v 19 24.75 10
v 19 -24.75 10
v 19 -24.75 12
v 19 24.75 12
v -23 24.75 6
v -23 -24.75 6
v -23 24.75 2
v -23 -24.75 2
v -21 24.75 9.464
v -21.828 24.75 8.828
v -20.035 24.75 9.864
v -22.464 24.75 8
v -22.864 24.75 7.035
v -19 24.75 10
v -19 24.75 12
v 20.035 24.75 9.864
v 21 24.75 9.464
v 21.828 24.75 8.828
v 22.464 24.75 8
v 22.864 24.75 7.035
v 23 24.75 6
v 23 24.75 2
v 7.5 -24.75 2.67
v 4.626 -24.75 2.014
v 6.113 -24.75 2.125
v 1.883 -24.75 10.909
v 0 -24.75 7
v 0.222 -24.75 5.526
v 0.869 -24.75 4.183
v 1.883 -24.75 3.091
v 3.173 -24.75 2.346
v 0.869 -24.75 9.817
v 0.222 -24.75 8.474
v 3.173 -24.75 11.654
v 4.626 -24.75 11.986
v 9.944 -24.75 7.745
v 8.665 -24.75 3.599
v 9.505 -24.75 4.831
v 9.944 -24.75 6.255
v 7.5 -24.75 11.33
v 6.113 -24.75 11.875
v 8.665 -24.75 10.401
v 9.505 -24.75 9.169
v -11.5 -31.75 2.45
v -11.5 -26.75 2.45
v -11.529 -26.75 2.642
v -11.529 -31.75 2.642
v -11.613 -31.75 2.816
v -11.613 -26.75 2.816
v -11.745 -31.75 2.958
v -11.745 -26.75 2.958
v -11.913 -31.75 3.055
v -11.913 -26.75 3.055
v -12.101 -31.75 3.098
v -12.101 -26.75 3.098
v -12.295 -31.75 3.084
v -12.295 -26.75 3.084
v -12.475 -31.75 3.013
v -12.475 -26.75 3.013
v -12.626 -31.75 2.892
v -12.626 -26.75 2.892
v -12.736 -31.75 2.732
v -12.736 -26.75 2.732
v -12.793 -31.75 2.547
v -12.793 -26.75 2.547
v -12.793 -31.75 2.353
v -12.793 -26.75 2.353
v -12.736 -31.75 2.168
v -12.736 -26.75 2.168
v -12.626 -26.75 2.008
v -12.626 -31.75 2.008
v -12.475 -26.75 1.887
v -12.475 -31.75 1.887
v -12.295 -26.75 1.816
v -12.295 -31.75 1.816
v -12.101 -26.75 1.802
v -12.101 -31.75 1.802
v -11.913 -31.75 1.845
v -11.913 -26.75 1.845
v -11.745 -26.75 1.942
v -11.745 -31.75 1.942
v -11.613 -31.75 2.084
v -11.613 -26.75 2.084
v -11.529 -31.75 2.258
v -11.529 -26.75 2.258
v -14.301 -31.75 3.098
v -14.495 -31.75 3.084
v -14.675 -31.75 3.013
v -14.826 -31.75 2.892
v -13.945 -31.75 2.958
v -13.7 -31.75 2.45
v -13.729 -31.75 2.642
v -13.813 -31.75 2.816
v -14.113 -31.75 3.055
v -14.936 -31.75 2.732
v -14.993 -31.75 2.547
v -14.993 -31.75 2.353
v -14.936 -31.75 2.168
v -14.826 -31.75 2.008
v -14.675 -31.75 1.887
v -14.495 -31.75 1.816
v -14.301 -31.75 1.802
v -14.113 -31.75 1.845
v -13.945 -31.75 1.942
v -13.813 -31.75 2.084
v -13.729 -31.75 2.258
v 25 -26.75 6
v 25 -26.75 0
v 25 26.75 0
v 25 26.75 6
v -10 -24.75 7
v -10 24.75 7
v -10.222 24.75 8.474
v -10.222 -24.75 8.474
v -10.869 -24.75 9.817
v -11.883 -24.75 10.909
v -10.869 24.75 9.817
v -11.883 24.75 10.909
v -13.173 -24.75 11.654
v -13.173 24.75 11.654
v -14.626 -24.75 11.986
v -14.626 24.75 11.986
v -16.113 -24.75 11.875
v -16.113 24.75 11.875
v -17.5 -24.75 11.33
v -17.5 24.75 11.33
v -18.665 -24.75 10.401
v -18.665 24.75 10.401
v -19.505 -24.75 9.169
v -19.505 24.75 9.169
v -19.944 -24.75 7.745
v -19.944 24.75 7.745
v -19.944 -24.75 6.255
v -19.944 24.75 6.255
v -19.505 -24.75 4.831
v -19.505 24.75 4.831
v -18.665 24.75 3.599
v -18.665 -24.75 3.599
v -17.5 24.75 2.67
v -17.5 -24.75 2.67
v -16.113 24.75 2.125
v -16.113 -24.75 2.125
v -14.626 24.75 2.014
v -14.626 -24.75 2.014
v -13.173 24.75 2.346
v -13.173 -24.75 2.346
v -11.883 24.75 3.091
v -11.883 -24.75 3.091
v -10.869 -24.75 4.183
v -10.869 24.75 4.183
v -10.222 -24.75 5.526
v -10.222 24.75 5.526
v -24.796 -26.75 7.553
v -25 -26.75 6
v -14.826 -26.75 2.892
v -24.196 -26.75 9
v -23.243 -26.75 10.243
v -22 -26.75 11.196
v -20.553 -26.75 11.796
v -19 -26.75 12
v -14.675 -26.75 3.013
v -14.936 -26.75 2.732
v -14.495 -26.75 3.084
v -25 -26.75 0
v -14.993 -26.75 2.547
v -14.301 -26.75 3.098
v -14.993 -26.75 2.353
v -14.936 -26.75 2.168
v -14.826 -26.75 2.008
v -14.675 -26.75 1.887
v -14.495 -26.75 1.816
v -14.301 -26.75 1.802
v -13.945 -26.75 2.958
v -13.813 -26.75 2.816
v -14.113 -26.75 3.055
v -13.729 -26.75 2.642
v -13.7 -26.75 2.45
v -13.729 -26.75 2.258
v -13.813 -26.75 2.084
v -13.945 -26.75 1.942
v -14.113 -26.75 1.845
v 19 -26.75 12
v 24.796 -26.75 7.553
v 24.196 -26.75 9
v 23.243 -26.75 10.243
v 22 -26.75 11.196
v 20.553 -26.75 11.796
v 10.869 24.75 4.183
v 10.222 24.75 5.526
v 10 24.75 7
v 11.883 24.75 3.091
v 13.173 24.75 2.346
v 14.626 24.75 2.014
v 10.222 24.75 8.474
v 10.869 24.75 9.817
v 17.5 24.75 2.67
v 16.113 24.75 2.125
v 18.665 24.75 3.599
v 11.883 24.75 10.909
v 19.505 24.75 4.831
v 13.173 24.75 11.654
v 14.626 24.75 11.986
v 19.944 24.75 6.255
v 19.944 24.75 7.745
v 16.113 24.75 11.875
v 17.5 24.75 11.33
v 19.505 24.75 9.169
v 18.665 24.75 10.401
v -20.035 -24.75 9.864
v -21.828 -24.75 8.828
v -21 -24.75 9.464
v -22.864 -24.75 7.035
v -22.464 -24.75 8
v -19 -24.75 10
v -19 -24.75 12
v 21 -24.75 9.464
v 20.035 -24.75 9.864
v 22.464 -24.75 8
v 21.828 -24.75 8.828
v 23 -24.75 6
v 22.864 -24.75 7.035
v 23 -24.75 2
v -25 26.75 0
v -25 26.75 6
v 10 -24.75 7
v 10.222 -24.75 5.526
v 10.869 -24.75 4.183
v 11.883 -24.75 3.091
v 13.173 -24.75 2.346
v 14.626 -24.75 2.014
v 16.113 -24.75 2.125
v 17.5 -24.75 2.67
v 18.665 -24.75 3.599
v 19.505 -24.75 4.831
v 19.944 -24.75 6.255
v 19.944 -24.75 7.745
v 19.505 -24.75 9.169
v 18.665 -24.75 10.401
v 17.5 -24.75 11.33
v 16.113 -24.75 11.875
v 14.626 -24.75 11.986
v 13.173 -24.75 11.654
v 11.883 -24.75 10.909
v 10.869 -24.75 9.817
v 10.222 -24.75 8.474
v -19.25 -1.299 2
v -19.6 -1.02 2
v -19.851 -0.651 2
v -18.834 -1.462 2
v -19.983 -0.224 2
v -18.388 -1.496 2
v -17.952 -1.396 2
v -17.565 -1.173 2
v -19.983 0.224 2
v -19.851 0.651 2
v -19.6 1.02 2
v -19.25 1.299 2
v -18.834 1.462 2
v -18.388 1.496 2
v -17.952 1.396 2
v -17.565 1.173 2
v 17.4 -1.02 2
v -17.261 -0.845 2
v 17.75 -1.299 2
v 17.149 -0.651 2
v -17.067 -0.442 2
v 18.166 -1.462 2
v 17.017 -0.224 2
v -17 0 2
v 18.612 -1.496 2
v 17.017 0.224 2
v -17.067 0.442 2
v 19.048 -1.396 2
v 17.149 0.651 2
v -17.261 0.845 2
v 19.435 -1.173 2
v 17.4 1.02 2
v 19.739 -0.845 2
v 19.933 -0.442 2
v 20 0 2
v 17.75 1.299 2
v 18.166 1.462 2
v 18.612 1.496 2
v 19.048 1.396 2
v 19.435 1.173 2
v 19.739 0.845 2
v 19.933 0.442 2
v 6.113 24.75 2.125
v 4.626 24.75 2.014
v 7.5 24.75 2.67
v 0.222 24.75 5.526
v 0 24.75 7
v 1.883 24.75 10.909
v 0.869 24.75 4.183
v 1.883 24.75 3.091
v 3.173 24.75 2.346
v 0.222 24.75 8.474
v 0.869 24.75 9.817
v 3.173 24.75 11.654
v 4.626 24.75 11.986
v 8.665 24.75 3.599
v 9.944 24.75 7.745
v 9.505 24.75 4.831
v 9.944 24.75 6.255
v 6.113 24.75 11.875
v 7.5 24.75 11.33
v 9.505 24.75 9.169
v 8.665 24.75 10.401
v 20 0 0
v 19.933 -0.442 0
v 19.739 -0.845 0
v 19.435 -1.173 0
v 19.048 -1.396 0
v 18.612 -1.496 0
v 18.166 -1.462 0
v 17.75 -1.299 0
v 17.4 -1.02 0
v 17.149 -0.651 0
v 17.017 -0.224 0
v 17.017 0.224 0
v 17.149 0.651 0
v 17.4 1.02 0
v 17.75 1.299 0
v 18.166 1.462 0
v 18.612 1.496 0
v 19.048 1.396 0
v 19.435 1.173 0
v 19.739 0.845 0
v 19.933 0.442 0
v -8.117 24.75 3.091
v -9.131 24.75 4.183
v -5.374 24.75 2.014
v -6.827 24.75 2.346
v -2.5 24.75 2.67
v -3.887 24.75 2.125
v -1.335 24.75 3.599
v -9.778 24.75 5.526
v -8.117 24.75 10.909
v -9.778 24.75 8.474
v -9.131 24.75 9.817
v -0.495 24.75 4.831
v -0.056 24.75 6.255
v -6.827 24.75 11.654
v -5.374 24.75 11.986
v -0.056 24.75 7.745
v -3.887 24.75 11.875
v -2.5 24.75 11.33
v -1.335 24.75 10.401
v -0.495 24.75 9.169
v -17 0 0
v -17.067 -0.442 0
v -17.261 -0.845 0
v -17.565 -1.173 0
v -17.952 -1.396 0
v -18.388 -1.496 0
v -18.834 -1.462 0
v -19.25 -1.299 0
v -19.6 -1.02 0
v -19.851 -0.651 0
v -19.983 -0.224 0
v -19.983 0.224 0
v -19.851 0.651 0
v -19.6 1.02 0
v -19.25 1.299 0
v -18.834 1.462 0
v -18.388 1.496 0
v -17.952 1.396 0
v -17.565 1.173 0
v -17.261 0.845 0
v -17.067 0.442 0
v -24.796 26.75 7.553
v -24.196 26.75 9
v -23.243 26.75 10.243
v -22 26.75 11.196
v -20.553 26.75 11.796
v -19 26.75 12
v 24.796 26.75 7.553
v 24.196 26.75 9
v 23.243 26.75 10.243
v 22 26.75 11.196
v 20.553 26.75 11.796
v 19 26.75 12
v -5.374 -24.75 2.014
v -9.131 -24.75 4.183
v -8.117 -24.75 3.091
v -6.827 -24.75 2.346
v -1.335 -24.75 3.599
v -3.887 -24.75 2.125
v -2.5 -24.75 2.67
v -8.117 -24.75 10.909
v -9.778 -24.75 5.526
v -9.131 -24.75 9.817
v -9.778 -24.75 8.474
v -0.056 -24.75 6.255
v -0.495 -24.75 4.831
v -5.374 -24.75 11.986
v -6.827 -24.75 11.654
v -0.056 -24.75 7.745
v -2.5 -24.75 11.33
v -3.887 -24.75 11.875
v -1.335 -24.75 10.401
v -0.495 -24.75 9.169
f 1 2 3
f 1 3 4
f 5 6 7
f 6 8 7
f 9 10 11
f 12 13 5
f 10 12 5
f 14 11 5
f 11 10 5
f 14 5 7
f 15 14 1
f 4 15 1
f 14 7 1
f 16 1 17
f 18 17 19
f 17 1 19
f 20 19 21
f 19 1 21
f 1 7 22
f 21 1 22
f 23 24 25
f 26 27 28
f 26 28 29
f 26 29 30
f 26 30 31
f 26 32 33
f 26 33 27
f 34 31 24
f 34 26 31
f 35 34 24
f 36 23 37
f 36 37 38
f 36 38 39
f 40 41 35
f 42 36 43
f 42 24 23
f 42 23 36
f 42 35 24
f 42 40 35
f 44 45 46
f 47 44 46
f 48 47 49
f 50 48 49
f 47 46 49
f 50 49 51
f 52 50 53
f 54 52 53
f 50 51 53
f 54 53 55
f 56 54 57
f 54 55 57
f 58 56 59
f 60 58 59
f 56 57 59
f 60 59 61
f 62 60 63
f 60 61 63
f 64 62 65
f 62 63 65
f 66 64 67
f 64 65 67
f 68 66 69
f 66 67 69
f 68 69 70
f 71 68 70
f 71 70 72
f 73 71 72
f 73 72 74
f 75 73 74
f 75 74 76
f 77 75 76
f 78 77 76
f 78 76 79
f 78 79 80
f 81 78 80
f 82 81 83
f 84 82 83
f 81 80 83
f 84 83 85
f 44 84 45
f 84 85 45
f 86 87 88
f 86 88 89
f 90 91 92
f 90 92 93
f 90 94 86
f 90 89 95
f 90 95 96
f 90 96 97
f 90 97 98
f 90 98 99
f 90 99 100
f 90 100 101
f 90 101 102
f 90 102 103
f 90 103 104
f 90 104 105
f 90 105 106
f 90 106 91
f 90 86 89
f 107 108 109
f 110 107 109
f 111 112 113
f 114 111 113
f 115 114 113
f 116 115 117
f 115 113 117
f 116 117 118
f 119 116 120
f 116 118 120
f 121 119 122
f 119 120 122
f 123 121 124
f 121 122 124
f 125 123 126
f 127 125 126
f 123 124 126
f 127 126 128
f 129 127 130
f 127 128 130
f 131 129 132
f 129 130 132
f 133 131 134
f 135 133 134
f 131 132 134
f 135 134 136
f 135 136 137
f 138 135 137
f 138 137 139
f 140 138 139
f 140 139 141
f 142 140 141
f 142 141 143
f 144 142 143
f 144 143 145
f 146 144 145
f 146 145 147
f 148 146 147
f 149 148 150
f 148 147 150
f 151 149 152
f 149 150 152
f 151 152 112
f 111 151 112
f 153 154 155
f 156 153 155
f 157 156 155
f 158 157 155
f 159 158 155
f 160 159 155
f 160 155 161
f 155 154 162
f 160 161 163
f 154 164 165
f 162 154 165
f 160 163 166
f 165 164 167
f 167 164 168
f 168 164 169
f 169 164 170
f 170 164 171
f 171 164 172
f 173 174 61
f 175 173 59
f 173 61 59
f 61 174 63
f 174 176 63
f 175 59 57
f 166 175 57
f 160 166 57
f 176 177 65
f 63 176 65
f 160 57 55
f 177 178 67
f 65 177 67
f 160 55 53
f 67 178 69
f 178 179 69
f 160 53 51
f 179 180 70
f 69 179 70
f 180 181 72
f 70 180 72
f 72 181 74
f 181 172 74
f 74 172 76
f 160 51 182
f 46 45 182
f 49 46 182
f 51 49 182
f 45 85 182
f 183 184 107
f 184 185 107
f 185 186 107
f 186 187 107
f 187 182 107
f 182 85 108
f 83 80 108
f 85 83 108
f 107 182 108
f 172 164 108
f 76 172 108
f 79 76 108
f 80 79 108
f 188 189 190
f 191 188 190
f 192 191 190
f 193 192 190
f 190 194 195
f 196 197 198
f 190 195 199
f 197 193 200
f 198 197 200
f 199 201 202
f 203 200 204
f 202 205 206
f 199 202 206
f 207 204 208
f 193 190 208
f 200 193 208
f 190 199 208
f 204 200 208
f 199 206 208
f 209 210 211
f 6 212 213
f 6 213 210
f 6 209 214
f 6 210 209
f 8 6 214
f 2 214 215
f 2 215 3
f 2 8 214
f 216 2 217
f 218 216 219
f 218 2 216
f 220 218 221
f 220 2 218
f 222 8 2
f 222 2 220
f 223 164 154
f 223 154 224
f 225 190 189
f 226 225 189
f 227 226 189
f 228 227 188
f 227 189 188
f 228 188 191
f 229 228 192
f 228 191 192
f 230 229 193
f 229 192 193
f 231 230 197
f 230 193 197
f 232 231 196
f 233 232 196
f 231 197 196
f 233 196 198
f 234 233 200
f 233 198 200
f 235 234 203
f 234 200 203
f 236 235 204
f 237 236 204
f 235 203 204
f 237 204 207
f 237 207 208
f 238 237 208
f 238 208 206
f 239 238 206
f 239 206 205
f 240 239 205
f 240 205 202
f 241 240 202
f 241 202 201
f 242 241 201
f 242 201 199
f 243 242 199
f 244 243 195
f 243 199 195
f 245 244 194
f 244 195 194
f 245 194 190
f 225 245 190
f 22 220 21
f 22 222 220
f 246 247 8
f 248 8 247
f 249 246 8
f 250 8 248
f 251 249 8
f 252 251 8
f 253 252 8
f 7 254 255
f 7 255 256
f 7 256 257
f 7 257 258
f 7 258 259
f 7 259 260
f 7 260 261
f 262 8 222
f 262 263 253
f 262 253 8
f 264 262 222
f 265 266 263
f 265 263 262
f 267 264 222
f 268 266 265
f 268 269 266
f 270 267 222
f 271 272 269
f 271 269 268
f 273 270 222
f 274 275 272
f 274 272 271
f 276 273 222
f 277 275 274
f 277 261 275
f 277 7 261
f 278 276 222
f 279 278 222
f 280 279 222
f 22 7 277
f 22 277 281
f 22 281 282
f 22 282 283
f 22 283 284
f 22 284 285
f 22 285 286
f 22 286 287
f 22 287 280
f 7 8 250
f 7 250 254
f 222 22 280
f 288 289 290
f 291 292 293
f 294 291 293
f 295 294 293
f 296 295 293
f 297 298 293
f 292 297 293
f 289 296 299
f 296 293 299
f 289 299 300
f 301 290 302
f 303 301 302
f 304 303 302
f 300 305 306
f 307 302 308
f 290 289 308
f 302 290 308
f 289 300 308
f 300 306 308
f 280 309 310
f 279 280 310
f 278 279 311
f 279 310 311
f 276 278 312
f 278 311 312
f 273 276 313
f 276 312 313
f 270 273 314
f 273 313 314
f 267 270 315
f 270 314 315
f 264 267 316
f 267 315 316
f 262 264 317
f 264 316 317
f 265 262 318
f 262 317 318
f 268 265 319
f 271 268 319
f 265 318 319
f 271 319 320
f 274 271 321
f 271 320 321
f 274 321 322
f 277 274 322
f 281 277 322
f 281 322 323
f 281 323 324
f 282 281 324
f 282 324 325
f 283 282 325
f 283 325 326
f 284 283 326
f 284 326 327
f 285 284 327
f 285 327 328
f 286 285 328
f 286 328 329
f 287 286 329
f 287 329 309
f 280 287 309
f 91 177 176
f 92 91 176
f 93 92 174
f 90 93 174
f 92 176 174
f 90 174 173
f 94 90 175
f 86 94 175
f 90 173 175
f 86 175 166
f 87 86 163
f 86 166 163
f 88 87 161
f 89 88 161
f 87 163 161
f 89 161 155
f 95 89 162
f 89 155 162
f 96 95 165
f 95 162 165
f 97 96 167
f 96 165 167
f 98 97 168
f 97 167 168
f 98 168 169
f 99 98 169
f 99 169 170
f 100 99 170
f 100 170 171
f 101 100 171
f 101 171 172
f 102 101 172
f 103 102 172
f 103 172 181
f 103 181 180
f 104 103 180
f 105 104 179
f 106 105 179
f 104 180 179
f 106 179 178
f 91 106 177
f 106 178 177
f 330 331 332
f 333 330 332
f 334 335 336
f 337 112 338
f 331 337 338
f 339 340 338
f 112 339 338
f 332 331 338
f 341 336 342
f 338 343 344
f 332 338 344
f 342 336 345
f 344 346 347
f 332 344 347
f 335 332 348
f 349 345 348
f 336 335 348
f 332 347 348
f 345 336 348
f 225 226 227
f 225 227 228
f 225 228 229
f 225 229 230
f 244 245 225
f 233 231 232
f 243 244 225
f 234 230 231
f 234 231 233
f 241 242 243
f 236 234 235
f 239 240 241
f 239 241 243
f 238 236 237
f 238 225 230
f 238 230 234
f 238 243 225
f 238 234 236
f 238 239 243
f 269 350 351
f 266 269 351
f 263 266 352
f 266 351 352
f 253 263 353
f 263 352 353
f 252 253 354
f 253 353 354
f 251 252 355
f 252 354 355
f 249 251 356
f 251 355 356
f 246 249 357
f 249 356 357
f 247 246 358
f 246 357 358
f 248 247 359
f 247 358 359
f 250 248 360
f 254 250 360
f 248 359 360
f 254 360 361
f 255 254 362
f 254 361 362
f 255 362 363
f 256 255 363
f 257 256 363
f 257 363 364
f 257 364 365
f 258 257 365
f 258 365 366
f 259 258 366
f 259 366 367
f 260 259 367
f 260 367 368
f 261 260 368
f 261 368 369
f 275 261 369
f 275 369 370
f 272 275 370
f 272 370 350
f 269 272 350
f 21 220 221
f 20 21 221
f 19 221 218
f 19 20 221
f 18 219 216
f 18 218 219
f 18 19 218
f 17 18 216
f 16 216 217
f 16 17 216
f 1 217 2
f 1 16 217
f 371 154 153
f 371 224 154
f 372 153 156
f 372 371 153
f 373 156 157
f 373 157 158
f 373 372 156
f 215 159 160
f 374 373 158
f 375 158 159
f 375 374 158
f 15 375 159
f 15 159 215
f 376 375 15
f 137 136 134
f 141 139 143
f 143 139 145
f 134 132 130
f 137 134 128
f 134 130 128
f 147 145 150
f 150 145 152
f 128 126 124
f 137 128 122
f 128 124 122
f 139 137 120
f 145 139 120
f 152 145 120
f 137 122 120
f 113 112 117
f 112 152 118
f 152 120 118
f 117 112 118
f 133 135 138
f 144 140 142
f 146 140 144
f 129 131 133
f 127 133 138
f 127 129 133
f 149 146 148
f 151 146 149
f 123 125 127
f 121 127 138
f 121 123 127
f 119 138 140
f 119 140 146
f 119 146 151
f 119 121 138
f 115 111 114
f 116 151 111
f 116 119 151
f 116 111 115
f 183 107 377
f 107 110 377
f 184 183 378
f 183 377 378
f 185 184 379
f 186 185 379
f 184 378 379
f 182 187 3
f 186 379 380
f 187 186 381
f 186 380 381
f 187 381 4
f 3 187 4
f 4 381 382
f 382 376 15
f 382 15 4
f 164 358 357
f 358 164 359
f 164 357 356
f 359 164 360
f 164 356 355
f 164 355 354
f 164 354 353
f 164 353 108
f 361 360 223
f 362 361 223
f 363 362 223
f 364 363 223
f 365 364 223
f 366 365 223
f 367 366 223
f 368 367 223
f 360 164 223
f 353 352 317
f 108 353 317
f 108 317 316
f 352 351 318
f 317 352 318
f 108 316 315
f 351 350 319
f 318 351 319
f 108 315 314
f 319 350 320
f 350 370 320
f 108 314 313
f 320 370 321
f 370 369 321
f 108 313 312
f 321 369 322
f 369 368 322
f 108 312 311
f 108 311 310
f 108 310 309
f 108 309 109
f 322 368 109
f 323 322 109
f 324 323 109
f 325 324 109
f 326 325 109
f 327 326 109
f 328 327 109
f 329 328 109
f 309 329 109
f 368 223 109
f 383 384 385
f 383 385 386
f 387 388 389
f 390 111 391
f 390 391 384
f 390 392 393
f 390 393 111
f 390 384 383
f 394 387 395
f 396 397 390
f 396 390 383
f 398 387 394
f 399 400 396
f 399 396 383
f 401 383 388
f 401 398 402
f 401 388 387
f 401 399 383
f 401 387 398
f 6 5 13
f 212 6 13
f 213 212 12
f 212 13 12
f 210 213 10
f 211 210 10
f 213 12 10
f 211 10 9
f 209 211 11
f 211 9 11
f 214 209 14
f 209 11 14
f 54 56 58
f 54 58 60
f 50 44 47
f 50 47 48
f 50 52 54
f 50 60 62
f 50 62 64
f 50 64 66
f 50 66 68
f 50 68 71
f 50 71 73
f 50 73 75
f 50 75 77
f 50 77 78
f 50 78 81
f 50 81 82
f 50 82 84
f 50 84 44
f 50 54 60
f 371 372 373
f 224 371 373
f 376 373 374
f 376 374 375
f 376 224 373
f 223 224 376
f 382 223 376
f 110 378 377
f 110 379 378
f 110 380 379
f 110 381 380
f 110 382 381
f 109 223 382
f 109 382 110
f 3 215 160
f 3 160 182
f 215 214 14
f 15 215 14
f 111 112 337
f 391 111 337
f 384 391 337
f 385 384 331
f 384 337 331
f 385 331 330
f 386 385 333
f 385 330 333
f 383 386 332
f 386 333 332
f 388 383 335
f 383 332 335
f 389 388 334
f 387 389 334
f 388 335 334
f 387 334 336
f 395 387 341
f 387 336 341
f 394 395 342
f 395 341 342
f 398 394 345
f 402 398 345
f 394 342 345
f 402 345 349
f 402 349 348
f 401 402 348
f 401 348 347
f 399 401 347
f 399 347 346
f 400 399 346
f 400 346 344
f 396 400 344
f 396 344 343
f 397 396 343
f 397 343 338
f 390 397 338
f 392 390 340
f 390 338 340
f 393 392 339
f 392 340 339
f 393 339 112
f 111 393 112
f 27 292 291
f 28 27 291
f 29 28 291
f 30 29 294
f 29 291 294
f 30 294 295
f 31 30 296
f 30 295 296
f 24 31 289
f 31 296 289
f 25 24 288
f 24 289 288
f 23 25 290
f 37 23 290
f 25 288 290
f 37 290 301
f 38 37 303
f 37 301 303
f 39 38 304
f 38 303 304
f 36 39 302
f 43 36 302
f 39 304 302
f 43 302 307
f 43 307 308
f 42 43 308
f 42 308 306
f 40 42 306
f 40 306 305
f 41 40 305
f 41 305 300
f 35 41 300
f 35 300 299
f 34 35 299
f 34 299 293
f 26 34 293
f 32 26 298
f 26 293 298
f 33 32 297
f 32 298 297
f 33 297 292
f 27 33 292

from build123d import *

# Parameters (mm, degrees)
F0_W     = 50
F0_H     = 53.5
F1_DEPTH = 12
F2_R     = 6
F3_T     = -2
F4_R     = 1.5
F5_DEPTH = 3
F6_R     = 0.65
F7_DEPTH = 5
F8_R     = 5
F9_DEPTH = 49.5


# Not quite as in the source:
# - a shell that OpenCascade refuses in one call is made with other operations: the cavity is built on its own and cut out


with BuildPart() as f1:
    # F0 (on Top) → F1 (new body)
    with BuildSketch(Plane.XY):
        Rectangle(F0_W, F0_H)
    extrude(amount=F1_DEPTH)

    # F2
    f2_edges = [f1.edges().sort_by_distance(p)[0] for p in [
        (25, 0, 12),
        (-25, 0, 12),
    ]]
    fillet(f2_edges, radius=F2_R)

    # F3: a shell. OpenCascade refuses it in one call, so the cavity is built on its own and cut out:
    # the body offset inwards by the wall thickness, plus a prism from it out through each open face.
    f3_core = offset(f1.part, amount=F3_T, mode=Mode.PRIVATE)
    f3_exits = [f3_core.faces().sort_by_distance(p)[0] for p in [
        (0, 0, 10),
    ]]
    add(f3_core, mode=Mode.SUBTRACT)
    extrude(f3_exits, amount=-F3_T, mode=Mode.SUBTRACT)

    # F4 (on face) → F5 (cut)
    with BuildSketch(Plane(origin=(0, 0, 0), x_dir=(1, 0, 0), z_dir=(0, 0, -1))):
        with Locations((-18.5, 0)):
            Circle(F4_R)
        with Locations((18.5, 0)):
            Circle(F4_R)
    extrude(amount=-F5_DEPTH, mode=Mode.SUBTRACT)

    # F6 (on face) → F7 (join)
    with BuildSketch(Plane.XZ.offset(26.75)):
        with Locations((-14.35, 2.45)):
            Circle(F6_R)
        with Locations((-12.15, 2.45)):
            Circle(F6_R)
    extrude(amount=F7_DEPTH)


with BuildPart() as f9:
    # F8 (on face) → F9 (new body, through all)
    with BuildSketch(Plane.XZ.offset(-24.75)):
        with Locations((-15, 7)):
            Circle(F8_R)
    extrude(amount=F9_DEPTH)


with BuildPart() as f9b:
    # F8 (on face) → F9, piece 2 (new body, through all)
    with BuildSketch(Plane.XZ.offset(-24.75)):
        with BuildLine():
            ThreePointArc((20, 7), (15, 12), (10, 7))
            ThreePointArc((10, 7), (15, 2), (20, 7))
        make_face()
    extrude(amount=F9_DEPTH)


with BuildPart() as f9c:
    # F8 (on face) → F9, piece 3 (new body, through all)
    with BuildSketch(Plane.XZ.offset(-24.75)):
        with BuildLine():
            ThreePointArc((10, 7), (5, 12), (0, 7))
            ThreePointArc((0, 7), (5, 2), (10, 7))
        make_face()
    extrude(amount=F9_DEPTH)


with BuildPart() as f9d:
    # F8 (on face) → F9, piece 4 (new body, through all)
    with BuildSketch(Plane.XZ.offset(-24.75)):
        with BuildLine():
            ThreePointArc((0, 7), (-5, 12), (-10, 7))
            ThreePointArc((-10, 7), (-5, 2), (0, 7))
        make_face()
    extrude(amount=F9_DEPTH)


solid = Compound([f1.part, f9.part, f9b.part, f9c.part, f9d.part])
